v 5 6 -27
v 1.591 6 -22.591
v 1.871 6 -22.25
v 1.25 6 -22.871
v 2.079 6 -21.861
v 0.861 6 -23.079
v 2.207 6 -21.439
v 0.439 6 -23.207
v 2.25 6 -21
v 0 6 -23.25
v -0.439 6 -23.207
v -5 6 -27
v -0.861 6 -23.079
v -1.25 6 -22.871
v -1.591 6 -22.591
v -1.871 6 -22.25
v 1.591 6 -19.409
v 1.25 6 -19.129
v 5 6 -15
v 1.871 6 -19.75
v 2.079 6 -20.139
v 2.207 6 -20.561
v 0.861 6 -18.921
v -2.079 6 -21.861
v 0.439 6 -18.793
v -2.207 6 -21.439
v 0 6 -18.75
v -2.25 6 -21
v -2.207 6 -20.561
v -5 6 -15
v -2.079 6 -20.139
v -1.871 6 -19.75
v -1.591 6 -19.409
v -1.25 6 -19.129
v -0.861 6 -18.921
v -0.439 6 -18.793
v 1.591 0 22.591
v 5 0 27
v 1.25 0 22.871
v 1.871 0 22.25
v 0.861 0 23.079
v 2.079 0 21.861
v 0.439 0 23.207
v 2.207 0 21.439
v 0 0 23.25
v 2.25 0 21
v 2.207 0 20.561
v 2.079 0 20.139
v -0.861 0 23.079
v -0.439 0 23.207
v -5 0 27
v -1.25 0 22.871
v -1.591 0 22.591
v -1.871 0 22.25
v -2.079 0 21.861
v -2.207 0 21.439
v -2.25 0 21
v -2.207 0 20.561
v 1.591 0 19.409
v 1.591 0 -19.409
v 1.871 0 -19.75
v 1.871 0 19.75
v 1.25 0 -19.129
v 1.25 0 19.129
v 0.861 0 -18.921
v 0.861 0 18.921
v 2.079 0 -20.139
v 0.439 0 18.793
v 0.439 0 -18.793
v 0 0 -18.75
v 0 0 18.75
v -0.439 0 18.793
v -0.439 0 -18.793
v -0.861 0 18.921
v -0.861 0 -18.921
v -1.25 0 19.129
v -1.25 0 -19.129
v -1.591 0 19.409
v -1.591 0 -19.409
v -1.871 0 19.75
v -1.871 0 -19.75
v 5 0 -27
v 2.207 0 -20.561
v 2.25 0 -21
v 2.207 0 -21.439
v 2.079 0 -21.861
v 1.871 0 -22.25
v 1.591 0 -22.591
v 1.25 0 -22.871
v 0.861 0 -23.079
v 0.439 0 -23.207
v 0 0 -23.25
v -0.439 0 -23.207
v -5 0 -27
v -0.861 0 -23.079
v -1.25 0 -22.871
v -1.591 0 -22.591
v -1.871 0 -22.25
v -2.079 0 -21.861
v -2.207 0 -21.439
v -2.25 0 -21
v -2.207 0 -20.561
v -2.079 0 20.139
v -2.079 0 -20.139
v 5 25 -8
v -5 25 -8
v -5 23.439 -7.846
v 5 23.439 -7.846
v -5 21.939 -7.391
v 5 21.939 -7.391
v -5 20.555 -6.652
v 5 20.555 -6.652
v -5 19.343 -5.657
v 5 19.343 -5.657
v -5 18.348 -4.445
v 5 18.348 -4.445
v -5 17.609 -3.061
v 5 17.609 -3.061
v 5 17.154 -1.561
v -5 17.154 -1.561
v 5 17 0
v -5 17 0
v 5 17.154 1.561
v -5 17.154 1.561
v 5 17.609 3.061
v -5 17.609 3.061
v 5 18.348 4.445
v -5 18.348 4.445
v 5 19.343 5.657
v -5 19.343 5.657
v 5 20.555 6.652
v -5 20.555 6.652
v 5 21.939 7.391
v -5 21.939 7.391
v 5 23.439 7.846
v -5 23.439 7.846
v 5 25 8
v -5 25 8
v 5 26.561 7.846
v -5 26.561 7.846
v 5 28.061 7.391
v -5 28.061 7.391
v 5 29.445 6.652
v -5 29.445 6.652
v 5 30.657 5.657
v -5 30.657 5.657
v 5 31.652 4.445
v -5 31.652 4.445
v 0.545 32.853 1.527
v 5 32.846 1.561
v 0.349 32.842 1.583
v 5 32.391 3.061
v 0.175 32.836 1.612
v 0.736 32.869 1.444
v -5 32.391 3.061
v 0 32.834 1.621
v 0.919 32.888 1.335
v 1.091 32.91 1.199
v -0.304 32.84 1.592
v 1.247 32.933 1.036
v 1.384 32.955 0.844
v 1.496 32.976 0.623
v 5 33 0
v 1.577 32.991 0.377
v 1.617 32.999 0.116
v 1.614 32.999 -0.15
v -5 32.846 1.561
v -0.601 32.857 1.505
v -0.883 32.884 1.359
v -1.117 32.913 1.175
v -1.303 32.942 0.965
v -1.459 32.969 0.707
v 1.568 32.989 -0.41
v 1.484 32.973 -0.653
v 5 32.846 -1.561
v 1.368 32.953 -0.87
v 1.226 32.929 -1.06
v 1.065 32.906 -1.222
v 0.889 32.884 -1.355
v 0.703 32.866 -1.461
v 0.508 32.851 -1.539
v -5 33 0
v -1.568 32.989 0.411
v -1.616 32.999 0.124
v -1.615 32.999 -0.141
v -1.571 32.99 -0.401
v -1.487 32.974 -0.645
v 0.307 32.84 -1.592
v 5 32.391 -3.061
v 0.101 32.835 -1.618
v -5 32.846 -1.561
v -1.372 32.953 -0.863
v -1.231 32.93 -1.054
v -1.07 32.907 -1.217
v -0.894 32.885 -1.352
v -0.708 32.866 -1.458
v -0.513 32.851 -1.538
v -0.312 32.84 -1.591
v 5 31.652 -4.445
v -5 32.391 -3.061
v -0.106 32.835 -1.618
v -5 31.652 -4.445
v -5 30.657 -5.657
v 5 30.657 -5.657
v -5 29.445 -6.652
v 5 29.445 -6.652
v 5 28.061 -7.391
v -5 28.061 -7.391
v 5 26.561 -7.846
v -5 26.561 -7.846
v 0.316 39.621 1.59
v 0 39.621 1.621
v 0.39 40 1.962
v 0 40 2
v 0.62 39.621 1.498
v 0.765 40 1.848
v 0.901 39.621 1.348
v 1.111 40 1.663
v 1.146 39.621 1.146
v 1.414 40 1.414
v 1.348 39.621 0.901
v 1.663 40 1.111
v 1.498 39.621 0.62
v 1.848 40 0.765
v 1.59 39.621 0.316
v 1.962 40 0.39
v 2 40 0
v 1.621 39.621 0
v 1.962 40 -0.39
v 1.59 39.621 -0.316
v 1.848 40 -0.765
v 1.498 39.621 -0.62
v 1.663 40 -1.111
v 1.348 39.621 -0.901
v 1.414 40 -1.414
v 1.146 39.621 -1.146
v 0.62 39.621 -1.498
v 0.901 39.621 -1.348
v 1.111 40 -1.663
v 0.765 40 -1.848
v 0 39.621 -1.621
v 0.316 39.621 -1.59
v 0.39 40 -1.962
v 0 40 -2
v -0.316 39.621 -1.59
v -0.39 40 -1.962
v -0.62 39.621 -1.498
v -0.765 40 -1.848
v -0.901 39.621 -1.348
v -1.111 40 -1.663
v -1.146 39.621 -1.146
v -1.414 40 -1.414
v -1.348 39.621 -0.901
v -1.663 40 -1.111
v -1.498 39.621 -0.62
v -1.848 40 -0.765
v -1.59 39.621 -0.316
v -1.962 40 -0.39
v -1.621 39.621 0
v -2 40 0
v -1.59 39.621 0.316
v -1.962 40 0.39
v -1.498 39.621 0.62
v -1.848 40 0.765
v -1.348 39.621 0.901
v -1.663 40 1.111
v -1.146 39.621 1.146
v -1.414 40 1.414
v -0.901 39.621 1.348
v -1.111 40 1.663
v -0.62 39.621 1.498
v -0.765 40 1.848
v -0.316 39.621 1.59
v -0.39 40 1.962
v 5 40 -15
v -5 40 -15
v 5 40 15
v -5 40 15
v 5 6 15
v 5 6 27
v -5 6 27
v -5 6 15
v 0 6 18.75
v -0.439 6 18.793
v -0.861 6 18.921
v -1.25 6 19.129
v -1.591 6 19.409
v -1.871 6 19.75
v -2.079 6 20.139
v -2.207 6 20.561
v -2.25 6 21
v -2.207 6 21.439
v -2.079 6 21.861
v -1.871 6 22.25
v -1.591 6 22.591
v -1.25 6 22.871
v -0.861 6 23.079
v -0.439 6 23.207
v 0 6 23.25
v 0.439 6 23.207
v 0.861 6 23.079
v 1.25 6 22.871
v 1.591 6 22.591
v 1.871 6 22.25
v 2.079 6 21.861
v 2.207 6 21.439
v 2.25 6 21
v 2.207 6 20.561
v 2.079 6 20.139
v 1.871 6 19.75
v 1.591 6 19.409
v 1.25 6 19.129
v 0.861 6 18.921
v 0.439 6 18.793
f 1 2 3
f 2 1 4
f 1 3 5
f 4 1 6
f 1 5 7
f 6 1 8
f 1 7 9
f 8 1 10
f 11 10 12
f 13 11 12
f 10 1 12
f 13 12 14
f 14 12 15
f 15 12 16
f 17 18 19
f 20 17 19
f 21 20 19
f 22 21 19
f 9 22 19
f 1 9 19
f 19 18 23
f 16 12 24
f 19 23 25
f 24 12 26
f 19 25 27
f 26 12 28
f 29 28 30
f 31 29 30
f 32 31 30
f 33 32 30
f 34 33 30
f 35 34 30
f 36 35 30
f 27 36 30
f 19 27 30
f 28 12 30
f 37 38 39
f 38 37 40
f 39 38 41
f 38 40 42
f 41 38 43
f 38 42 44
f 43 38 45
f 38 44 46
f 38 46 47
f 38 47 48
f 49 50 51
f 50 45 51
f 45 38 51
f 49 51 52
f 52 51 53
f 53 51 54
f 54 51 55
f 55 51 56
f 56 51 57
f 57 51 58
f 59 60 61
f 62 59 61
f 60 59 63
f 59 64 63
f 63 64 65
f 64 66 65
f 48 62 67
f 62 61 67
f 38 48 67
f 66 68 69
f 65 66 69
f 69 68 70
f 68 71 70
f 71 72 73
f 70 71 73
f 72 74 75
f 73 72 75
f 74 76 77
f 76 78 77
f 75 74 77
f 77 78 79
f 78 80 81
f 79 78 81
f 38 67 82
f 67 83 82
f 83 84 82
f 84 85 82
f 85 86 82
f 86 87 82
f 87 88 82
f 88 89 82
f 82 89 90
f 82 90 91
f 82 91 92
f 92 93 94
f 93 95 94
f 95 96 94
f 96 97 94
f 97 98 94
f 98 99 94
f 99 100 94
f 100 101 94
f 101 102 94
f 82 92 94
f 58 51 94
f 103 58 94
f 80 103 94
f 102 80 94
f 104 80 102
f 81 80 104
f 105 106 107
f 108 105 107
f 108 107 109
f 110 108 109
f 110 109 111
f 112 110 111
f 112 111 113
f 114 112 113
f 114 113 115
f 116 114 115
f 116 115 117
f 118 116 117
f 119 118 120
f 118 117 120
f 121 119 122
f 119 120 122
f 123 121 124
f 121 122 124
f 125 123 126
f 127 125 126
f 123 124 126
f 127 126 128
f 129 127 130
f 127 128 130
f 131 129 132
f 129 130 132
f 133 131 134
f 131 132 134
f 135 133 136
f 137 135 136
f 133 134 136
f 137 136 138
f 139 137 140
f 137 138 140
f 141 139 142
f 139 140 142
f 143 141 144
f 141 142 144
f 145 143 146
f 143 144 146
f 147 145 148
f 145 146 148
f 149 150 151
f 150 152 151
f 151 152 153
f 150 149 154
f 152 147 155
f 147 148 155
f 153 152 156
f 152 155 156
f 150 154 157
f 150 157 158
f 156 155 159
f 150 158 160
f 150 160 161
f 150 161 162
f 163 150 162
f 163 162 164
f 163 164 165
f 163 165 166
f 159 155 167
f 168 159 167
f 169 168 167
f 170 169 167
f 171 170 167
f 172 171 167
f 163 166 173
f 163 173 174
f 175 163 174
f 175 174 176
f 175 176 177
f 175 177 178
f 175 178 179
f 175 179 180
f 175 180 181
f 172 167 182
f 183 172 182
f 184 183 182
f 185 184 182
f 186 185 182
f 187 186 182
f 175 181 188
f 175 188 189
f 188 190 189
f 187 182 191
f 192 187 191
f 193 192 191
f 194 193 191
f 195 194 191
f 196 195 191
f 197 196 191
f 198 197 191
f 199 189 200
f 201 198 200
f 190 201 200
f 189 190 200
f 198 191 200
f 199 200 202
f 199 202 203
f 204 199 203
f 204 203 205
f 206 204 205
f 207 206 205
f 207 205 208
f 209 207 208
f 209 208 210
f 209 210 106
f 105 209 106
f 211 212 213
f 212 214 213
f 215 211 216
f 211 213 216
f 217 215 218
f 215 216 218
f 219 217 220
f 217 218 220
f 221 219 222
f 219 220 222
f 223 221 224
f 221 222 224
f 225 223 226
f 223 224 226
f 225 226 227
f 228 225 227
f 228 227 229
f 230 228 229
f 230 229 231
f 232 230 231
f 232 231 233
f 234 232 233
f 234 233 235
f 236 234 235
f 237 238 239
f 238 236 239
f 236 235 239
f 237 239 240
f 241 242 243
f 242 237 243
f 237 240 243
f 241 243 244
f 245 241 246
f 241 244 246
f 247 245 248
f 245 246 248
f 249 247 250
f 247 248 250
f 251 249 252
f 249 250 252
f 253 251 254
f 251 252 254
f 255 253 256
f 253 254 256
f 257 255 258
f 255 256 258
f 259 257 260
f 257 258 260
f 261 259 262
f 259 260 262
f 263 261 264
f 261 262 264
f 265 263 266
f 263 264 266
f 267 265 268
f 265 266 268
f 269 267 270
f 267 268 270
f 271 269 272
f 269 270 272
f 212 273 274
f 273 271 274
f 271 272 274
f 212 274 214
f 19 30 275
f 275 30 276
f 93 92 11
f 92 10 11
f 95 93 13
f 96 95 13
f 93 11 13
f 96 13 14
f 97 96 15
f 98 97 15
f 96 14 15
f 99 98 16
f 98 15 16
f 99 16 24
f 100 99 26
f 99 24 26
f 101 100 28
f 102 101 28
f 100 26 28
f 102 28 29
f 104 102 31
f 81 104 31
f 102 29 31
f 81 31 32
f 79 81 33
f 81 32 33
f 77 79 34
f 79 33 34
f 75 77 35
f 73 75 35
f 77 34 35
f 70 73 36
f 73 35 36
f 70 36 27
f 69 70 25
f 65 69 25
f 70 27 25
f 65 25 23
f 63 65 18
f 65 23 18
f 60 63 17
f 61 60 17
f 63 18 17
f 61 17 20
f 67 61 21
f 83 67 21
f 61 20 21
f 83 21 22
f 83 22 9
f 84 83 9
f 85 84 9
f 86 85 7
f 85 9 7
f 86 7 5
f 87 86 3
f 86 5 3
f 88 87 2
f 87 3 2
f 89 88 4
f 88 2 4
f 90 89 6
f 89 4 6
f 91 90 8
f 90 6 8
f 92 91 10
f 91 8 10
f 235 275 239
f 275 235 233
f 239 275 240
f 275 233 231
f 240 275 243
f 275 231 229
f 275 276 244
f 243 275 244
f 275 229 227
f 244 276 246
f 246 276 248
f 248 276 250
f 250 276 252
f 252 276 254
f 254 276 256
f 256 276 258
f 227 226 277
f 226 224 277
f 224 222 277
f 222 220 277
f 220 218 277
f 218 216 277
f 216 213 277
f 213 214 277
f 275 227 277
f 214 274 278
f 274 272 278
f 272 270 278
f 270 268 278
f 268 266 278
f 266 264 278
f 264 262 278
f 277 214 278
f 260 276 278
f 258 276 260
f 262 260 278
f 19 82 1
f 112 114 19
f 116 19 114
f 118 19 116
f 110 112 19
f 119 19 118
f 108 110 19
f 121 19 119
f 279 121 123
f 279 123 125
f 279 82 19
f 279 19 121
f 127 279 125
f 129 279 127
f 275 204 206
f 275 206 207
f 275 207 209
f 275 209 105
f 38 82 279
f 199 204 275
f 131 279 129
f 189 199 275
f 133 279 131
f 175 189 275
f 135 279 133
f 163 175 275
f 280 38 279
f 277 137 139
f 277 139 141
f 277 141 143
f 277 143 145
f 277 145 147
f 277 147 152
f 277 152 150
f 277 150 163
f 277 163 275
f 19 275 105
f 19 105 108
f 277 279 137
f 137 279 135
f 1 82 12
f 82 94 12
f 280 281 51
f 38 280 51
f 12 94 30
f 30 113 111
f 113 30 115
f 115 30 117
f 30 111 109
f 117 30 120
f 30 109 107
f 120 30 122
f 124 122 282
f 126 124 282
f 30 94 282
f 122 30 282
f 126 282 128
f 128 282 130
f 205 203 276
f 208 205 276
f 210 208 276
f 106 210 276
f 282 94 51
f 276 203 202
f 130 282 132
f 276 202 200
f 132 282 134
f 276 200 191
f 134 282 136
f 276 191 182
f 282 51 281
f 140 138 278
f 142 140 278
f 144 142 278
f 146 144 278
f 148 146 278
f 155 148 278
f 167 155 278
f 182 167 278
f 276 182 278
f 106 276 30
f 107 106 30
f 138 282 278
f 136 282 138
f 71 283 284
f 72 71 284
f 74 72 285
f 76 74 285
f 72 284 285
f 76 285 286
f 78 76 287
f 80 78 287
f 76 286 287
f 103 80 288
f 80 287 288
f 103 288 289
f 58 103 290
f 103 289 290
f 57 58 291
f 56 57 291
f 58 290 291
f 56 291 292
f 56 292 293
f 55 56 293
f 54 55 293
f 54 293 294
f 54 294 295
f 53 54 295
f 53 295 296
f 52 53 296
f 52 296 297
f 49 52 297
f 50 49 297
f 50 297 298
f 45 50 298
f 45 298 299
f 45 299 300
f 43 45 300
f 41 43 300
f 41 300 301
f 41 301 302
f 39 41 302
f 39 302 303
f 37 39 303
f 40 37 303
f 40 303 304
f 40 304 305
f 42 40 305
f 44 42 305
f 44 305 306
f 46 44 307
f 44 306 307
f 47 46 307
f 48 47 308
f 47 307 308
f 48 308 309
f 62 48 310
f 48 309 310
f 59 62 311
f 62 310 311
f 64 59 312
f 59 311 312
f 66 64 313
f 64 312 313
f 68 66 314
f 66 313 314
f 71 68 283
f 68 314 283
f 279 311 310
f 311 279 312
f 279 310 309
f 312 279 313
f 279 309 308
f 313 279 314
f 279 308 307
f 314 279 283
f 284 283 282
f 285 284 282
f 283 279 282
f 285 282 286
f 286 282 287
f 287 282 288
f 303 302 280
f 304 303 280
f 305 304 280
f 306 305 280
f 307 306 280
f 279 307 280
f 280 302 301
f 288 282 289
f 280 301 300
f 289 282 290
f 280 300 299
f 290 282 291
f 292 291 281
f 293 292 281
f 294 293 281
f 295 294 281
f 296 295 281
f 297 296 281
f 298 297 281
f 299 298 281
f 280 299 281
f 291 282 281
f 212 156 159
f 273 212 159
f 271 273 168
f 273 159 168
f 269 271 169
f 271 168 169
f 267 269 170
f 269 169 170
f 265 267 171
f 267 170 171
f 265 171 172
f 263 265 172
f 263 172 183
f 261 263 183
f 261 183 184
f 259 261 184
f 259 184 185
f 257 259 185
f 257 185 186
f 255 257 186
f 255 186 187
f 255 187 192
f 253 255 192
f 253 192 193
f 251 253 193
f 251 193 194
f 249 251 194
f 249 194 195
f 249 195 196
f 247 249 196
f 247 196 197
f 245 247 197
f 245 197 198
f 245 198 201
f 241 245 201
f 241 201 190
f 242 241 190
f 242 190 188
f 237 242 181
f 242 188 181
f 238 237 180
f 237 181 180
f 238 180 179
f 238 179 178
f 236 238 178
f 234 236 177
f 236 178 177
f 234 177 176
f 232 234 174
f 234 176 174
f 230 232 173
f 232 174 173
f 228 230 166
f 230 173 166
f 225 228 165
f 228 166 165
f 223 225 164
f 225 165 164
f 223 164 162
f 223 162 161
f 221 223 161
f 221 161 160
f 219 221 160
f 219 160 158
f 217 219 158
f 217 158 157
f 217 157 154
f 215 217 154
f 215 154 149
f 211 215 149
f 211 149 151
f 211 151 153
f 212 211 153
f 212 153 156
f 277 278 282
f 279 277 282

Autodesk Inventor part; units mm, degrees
sketch "Sketch_1" plane through (0, 0, 0) normal (1, 0, 0) x (0, 1, 0)
  line L0 (6, 27) -> (0, 27)
  line L1 (0, 27) -> (0, -27)
  line L2 (0, -27) -> (6, -27)
  line L3 (6, -27) -> (6, -15)
  line L4 (6, -15) -> (40, -15)
  line L5 (40, -15) -> (40, 15)
  line L6 (40, 15) -> (6, 15)
  line L7 (6, 15) -> (6, 27)
extrude "Extrusion1" add sketch "Sketch_1" along normal mid plane 10
sketch "Sketch2" plane through (-5, 40, 15) normal (0, 1, 0) x (1, 0, 0)
  point P0 (5, 15)
hole "Hole1" at (0, 40, 0) direction (0, -1, 0) diameter 3.242 depth 14.0641 tip angle 120 countersink diameter 4 countersink angle 90 thread size "M4x0.7" class "6H" standard "ISO Metric profile"
sketch "Sketch3" plane through (-5, 0, -27) normal (0, -1, 0) x (1, 0, 0)
  point P0 (5, 6)
hole "Hole2" at (0, 0, -21) direction (0, 1, 0) diameter 4.5 depth 6
pattern_linear "Rectangular Pattern1" count 2 spacing 42 along (0, 0, 1) of "Hole2"
sketch "Sketch4" plane through (5, 0, 0) normal (1, 0, 0) x (0, 0, -1)
  point P0 (0, 25)
hole "Hole3" at (5, 25, 0) direction (-1, 0, 0) diameter 16 depth 10
ref_plane "b_s_XY" through (0, 33, 0) normal (0, 1, 0) x (1, 0, 0)
ref_plane "b_s_YZ" through (0, 33, 0) normal (1, 0, 0) x (0, 0, -1)
ref_plane "b_s_ZX" through (0, 33, 0) normal (0, 0, -1) x (0, 1, 0)
properties part number "SHTA16-25_b"
